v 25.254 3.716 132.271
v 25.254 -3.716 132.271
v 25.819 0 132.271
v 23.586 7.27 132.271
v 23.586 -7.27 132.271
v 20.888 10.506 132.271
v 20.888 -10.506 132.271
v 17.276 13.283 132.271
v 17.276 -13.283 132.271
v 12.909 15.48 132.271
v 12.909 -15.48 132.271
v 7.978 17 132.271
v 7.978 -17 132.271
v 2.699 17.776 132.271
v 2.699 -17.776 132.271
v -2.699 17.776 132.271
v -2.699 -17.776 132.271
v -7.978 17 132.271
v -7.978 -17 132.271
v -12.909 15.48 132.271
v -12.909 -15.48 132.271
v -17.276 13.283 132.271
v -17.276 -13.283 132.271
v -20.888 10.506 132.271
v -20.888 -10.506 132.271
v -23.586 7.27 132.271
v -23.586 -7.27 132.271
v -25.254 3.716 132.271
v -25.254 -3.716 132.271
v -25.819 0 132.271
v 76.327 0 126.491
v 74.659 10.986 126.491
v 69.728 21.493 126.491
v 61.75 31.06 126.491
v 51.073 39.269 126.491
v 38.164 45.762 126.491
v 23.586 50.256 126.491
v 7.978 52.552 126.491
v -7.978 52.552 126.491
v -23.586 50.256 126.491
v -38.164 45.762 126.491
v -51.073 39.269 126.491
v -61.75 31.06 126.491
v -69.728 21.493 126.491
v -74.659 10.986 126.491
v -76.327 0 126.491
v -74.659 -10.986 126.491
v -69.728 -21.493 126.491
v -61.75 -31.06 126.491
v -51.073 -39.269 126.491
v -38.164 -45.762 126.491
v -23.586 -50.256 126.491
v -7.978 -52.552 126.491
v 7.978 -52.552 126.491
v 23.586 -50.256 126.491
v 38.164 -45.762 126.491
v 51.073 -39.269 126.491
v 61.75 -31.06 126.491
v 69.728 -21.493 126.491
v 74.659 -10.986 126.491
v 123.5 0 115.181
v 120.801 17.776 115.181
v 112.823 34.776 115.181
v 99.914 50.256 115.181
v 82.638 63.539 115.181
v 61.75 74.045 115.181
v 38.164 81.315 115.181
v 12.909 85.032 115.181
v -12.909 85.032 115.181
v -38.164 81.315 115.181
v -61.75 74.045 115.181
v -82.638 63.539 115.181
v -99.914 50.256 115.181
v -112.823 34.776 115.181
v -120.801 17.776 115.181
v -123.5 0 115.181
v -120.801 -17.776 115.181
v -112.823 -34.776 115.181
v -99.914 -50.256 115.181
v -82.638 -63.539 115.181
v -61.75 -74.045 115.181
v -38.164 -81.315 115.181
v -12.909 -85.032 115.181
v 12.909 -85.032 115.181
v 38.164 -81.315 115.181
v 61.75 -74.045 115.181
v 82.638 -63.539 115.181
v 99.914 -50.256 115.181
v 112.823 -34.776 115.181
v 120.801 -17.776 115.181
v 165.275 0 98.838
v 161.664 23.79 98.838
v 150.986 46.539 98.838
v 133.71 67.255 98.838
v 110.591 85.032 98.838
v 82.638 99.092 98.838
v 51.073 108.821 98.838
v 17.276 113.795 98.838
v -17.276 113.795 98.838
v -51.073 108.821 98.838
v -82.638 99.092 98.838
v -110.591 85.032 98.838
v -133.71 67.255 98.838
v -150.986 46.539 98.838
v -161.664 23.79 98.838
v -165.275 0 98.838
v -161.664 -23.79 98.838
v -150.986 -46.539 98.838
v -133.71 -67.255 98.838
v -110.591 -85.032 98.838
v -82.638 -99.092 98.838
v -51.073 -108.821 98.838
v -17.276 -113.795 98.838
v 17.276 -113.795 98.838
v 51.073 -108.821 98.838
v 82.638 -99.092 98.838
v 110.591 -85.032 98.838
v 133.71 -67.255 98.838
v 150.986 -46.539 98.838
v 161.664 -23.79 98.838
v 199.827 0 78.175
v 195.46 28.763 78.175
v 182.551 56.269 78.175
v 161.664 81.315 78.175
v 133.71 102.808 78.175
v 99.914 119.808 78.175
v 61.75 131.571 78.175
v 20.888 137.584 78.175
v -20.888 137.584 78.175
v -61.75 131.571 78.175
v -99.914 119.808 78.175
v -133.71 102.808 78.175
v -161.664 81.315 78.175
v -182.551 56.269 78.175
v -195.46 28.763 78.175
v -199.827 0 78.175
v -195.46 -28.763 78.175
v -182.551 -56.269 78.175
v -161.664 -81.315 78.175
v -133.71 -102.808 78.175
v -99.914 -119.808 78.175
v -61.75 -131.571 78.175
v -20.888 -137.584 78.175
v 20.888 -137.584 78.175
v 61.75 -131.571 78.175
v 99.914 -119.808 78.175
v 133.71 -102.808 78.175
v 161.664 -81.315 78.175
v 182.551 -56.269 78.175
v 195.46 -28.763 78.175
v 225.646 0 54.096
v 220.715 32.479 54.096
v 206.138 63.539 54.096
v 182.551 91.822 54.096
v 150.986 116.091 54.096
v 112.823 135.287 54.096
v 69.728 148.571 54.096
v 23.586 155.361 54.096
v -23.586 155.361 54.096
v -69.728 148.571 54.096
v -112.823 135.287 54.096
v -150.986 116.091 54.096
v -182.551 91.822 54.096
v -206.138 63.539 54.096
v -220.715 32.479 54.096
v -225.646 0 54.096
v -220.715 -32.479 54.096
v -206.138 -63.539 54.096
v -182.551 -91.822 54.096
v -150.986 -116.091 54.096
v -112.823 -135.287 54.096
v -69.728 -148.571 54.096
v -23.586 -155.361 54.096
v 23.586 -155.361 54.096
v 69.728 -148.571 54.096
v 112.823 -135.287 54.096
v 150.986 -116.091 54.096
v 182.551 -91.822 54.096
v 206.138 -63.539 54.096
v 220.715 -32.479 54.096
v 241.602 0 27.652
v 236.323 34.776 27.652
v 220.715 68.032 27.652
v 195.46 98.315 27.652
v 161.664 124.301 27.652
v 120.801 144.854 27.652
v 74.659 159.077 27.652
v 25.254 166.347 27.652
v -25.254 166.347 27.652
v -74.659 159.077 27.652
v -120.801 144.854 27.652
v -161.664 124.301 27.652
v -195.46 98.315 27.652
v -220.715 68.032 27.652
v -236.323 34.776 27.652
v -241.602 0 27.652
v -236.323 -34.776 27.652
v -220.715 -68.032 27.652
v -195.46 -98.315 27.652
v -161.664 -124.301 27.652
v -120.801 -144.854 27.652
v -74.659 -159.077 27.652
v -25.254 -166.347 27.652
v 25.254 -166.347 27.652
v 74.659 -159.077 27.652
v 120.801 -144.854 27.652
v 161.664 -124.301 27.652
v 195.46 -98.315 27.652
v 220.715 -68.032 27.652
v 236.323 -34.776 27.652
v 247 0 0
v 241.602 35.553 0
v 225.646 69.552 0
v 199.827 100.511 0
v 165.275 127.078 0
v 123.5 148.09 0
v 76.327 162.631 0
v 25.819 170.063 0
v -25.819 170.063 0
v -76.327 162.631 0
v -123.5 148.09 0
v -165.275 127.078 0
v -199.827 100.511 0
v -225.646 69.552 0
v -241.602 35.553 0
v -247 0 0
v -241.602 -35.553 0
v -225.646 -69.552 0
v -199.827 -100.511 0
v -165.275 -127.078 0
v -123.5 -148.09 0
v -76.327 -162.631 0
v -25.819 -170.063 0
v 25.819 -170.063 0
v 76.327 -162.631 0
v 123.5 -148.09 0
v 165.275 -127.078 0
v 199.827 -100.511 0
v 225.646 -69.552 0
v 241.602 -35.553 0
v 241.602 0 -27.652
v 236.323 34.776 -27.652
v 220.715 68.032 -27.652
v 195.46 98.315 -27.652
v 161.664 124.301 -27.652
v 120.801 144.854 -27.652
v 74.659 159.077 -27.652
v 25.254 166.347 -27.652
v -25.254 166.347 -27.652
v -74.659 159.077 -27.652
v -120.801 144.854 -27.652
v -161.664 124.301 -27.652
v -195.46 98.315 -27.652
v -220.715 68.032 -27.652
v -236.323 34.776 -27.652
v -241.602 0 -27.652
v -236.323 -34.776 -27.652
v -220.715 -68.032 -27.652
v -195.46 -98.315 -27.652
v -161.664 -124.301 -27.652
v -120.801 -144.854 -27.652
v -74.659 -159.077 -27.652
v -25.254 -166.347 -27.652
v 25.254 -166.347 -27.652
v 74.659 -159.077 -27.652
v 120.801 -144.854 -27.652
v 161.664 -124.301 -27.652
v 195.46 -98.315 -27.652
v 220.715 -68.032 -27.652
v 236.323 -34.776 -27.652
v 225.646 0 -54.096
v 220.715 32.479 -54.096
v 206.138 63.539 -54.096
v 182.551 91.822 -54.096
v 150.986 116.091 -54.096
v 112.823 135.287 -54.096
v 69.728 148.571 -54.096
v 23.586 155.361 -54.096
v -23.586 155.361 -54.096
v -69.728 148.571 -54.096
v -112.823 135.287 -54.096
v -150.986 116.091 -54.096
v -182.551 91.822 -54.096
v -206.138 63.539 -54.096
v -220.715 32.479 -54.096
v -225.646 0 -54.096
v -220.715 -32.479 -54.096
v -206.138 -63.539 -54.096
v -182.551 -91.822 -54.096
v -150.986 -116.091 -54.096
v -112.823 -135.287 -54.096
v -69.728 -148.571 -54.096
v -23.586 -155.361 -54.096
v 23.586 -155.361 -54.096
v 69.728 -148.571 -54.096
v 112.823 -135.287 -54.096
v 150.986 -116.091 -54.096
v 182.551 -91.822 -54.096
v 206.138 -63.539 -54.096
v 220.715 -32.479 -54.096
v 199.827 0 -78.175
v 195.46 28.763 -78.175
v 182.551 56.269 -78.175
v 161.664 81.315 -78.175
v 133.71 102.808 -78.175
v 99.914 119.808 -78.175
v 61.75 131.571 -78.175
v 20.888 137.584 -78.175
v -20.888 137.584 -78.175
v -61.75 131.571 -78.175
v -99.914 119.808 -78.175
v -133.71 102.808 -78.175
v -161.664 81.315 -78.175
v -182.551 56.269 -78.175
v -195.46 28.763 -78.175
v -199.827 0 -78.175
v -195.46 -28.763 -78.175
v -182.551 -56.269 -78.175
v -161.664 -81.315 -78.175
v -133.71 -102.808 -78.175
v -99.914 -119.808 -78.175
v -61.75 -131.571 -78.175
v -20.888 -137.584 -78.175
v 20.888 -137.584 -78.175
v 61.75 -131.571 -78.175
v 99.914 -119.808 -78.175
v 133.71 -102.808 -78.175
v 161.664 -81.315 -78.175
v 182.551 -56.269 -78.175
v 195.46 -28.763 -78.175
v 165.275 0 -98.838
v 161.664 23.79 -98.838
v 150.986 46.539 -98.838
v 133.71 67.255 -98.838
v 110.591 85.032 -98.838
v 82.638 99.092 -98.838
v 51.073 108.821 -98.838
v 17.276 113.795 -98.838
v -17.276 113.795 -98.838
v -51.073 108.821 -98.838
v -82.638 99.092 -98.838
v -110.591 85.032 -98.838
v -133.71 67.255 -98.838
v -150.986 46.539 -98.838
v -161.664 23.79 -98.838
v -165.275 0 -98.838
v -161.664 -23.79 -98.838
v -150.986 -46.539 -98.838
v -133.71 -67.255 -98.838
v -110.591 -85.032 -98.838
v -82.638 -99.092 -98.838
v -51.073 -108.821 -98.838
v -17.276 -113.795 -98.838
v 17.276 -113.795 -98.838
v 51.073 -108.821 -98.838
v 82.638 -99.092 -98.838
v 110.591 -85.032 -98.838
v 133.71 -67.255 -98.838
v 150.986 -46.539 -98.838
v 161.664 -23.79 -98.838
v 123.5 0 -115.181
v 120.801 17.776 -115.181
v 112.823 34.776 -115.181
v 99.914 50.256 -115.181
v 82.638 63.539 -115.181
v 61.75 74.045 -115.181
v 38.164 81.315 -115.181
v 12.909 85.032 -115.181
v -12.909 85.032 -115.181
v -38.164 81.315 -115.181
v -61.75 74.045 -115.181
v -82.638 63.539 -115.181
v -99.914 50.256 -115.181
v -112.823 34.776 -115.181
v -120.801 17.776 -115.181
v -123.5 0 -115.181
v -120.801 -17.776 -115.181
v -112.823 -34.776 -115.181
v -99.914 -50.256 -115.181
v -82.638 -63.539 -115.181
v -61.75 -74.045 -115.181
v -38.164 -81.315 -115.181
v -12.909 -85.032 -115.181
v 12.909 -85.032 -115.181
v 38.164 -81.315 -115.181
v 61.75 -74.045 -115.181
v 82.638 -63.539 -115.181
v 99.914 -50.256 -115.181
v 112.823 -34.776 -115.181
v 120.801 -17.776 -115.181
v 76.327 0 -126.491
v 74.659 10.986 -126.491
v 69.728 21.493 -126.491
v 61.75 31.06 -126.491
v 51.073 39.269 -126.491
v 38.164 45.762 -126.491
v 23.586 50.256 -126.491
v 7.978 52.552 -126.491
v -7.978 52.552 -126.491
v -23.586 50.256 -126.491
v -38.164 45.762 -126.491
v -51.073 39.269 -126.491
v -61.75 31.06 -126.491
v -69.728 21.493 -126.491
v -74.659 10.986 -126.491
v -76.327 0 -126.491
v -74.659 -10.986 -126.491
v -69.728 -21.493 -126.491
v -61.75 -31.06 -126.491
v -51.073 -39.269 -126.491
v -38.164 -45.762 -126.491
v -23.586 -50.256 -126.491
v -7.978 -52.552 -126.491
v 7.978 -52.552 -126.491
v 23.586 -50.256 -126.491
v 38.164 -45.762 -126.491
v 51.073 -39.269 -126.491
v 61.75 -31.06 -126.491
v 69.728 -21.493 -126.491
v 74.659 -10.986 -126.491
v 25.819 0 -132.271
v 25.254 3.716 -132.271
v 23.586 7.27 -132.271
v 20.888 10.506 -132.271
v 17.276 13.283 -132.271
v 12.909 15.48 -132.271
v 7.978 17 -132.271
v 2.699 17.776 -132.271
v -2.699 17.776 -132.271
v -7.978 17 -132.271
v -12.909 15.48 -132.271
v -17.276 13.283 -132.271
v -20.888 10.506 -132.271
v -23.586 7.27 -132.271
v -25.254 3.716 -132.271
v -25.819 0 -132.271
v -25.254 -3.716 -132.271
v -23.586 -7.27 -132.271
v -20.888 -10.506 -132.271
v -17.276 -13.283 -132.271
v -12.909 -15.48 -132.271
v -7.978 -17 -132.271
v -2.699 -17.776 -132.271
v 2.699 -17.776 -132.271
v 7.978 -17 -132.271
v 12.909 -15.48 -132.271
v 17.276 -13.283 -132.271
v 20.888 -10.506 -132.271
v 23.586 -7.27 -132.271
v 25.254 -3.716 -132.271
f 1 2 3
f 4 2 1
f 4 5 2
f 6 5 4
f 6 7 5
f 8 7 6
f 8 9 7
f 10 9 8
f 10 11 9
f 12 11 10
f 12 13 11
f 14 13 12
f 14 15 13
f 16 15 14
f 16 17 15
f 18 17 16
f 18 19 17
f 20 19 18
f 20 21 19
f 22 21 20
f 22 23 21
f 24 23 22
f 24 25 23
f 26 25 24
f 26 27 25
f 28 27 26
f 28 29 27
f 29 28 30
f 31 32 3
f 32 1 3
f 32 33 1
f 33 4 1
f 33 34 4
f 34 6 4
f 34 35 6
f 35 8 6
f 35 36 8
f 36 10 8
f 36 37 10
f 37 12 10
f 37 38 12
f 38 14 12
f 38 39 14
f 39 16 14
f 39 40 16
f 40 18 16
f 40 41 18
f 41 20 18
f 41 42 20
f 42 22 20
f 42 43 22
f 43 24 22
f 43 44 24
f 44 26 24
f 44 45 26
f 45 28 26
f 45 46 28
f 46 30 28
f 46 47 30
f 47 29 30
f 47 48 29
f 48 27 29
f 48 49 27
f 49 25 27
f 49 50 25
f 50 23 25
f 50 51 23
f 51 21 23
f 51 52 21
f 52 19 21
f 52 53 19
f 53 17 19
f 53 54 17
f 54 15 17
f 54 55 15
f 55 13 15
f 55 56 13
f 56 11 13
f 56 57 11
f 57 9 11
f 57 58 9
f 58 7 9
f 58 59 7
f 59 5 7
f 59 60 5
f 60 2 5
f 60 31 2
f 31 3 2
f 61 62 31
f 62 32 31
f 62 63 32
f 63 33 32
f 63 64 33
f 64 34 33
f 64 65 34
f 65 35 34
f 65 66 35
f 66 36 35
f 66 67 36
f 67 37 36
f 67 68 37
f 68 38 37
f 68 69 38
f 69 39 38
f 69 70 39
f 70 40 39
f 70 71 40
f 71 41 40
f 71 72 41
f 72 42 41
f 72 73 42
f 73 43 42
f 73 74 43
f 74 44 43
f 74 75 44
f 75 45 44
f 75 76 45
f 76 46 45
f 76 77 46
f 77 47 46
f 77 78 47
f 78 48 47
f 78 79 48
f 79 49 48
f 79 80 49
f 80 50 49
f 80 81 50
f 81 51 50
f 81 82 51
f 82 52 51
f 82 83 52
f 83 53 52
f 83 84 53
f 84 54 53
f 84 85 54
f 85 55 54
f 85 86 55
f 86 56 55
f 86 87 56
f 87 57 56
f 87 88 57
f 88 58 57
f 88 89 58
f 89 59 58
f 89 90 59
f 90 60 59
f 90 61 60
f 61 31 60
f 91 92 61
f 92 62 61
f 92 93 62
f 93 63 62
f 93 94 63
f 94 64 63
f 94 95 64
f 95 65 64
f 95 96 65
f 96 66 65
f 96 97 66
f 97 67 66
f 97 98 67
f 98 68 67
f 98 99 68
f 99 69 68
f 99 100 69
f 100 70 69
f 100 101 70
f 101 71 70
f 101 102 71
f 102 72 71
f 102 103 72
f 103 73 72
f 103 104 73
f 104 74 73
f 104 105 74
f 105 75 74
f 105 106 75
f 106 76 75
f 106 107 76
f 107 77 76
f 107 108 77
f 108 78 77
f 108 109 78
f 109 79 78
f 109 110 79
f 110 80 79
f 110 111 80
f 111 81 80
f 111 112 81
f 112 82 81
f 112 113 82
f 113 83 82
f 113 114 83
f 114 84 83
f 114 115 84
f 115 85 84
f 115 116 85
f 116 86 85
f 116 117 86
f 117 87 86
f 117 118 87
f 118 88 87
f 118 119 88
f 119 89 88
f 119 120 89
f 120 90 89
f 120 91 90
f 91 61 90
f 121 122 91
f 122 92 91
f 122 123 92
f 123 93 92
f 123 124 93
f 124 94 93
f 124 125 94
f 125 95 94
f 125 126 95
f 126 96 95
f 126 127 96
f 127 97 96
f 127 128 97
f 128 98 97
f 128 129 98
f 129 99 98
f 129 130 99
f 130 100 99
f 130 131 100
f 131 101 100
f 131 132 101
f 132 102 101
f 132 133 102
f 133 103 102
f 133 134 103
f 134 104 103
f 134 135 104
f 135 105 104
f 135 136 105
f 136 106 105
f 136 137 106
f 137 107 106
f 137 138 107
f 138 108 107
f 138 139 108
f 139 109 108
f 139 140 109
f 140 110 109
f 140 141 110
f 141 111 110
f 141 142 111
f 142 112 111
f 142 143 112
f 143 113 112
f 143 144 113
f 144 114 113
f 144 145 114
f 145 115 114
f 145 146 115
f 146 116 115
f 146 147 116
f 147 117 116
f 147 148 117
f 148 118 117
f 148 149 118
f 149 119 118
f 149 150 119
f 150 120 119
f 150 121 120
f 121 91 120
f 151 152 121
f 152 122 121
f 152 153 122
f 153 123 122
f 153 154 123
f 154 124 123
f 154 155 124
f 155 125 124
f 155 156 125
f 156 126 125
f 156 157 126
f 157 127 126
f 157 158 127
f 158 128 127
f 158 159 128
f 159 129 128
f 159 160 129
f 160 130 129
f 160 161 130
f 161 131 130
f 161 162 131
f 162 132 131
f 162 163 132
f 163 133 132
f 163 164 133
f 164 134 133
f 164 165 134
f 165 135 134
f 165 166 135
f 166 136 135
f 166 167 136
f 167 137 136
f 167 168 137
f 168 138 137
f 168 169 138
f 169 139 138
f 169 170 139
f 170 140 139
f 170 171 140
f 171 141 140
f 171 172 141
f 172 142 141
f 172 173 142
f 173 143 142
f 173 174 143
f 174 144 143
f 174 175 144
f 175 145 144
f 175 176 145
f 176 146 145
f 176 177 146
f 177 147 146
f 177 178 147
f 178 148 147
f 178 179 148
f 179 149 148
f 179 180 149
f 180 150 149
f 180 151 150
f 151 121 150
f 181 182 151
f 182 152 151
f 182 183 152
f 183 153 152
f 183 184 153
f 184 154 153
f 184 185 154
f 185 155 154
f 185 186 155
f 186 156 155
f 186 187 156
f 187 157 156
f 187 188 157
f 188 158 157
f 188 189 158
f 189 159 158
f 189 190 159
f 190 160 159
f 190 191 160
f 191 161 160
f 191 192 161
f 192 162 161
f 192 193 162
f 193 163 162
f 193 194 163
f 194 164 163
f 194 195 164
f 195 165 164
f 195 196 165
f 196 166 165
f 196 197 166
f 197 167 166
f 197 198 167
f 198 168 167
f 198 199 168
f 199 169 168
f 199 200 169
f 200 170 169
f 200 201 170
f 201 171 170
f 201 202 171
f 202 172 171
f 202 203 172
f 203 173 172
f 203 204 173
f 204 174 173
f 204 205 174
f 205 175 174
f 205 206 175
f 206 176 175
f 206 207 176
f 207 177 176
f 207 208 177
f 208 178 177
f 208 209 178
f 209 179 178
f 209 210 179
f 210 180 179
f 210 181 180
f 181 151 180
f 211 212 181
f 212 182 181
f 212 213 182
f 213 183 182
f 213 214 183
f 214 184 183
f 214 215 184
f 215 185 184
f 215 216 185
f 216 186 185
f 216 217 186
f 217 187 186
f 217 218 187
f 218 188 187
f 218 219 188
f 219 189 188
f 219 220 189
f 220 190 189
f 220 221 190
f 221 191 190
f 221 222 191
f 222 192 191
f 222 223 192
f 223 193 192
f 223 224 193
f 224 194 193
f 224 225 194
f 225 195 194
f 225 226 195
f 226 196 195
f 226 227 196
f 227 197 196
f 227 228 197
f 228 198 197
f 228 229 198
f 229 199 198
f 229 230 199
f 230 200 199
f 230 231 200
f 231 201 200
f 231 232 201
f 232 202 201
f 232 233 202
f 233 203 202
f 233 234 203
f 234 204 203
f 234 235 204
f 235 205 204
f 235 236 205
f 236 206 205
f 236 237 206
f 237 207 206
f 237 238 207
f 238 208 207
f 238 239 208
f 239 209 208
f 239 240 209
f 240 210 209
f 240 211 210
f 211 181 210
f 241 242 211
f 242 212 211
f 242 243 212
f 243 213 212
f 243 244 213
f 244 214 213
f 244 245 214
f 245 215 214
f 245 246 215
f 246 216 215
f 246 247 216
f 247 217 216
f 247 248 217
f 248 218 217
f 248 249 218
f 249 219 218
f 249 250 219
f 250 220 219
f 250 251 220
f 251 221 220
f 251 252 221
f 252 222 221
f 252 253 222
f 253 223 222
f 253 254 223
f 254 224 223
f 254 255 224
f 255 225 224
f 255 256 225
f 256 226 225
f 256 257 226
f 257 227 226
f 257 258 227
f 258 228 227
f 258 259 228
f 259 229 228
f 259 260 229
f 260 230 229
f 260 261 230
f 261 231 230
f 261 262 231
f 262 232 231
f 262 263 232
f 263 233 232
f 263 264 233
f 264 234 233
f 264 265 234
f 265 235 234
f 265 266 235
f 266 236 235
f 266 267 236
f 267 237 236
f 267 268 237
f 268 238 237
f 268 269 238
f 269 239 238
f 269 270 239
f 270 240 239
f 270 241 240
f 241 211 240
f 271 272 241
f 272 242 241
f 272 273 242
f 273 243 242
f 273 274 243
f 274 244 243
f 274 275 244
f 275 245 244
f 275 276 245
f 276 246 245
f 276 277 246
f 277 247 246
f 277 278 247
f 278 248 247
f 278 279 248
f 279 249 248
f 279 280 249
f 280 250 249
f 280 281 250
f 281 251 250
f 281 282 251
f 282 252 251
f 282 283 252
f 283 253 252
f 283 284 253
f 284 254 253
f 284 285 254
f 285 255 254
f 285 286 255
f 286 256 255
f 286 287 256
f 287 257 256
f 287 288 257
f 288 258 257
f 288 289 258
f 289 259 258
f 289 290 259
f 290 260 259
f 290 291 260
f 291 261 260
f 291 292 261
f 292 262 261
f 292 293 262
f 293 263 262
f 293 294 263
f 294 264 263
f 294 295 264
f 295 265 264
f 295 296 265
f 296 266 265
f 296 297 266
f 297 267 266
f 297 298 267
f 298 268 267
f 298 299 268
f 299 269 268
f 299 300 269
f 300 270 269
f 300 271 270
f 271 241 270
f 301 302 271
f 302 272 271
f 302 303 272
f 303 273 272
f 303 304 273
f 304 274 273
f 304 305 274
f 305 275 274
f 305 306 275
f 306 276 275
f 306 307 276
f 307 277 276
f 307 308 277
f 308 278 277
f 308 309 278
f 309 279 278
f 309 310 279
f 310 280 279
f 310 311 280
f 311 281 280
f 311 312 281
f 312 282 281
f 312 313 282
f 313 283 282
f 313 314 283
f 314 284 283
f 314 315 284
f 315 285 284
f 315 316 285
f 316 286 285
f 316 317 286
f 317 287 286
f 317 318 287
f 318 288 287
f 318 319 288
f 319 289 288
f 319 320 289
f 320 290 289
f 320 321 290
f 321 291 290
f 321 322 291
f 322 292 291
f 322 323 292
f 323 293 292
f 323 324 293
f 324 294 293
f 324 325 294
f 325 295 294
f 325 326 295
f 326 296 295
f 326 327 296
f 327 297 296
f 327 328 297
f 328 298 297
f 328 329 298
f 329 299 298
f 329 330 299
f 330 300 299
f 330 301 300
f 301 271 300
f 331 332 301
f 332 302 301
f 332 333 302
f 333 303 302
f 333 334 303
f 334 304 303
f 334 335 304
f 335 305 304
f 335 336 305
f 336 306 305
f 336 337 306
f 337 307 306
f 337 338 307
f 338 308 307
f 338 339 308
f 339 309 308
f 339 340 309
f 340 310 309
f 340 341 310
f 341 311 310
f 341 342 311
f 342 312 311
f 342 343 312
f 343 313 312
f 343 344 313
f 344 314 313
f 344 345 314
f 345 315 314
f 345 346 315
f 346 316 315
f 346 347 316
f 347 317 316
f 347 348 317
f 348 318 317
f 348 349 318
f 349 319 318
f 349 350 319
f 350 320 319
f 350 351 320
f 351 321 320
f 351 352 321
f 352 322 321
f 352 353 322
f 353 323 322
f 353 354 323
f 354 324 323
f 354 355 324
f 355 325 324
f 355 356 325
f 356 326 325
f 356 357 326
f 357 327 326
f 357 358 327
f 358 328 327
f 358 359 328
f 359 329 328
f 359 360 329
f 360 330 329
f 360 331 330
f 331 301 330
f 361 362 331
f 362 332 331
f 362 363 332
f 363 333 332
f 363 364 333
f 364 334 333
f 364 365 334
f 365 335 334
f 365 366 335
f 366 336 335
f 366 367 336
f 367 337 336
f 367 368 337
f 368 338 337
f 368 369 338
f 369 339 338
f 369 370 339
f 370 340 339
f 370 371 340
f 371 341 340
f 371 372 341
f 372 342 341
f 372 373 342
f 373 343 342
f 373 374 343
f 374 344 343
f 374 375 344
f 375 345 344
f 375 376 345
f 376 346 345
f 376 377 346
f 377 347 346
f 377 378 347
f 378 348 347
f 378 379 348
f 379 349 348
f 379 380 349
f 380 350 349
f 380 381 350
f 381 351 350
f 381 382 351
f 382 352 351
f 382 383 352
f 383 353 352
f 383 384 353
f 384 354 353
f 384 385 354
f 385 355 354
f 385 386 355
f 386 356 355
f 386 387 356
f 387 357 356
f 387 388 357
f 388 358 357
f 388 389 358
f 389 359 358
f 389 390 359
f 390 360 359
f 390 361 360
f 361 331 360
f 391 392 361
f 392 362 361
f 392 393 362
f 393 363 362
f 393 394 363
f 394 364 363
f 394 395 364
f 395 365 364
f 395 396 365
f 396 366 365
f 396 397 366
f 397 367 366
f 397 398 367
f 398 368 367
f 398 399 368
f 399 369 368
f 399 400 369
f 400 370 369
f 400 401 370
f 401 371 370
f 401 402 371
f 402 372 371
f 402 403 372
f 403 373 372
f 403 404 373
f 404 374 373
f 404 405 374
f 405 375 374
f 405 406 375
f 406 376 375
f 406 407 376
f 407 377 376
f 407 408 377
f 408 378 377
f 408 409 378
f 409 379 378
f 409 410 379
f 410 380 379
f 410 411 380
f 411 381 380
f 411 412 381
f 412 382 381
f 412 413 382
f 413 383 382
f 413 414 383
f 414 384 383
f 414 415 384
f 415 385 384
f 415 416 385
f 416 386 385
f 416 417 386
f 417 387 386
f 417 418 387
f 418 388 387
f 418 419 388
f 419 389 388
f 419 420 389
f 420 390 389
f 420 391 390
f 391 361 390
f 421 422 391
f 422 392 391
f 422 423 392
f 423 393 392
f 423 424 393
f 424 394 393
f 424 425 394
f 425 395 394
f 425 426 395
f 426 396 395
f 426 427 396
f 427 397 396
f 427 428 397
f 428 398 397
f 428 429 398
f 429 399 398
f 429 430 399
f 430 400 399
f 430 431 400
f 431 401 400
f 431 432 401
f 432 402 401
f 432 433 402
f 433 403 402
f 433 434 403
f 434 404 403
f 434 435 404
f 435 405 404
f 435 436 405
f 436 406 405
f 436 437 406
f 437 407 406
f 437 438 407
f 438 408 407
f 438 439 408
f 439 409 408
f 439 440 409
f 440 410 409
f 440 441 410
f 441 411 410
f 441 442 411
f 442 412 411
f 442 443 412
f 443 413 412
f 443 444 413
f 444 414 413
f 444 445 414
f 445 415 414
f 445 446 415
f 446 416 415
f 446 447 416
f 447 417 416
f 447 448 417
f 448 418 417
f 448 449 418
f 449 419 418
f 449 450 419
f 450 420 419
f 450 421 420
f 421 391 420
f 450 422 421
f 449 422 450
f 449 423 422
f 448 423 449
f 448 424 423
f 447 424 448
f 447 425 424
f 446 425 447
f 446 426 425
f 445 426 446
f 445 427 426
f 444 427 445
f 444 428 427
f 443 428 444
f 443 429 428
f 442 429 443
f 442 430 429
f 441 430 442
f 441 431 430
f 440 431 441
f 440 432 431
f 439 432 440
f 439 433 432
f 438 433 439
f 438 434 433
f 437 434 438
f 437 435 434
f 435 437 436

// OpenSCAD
// Generated by SolidPython 1.0.1 on 2020-07-29 00:46:50


scale(v = [13, 9, 7]) {
	sphere(r = 19);
}
/***********************************************
*********      SolidPython code:      **********
************************************************
 
# import packages: SolidPython
from solid import *
from solid.utils import *
from itertools import chain, combinations, permutations


class Resize:

    def __init__(self, scad_file):
        self.scad_file = scad_file
        #self.scad_file = import_scad(scad_file)
        # cone/cylinder param:
        self.r1 = 0
        self.r2 = 0
        self.h = 0
        # rectangular prism param:
        self.w = 0
        self.l = 0
        # ellipse param:
        self.r = 0

    # import OpenScad code (file name corresponds to shape)


    # classify shape + parameters
    def assign(self, param1, param2, param3):
        if self.scad_file == 'cone.scad':
            self.r1 = param1
            self.r2 = param2
            self.h = param3
        elif self.scad_file == 'cylinder.scad':
            self.r1 = param1
            self.r2 = param2
            self.h = param3
        elif self.scad_file == 'rectangularPrism.scad':
            self.h = param1
            self.l = param2
            self.w = param3
        else:
            self.r = param1
            self.h = param2

    # resize parameters
    def iterate(self):
        x = range(3, 20, 2)
        i = 1
        if self.scad_file == 'cone.scad':
            tempList = list(permutations(x, 2))
            for temp in tempList:
                param1 = temp[0]
                param2 = temp[1]
                filepath = 'produced_scad_files/' + 'cone' + str(param1) + '_' + str(param2) + '_' + '.scad'
                scad_render_to_file(cylinder(h=param1, r1=param2, r2=0), filepath)

        elif self.scad_file == 'cylinder.scad':
            tempList = list(permutations(x, 3))
            for temp in tempList:
                param1 = temp[0]
                param2 = temp[1]
                filepath = 'produced_scad_files/' + 'cylinder' + str(param1) + '_' + str(param2) + '_' + '.scad'
                scad_render_to_file(cylinder(h=param1, r1=param2, r2=param2), filepath)

        elif self.scad_file == 'rectangularPrism.scad':
            tempList = list(permutations(x, 3))
            for temp in tempList:
                param1 = temp[0]
                param2 = temp[1]
                param3 = temp[2]
                filepath = 'produced_scad_files/' + 'rectangularPrism' + str(param1) + '_' + str(param2) + '_' + str(
                    param3) + '.scad'
                scad_render_to_file(cube(size=(param1, param2, param3)), filepath)

        elif self.scad_file == 'ellipse.scad':
            tempList = list(permutations(x, 4))
            for temp in tempList:
                param1 = temp[0]
                param2 = temp[1]
                param3 = temp[2]
                param4 = temp[3]
                filepath = 'produced_scad_files/' + 'ellipse' + str(param1) + '_' + str(param2) + '_' + str(param3) + '_' + str(param4) + '.scad'
                scad_render_to_file(scale([param1, param2, param3])(sphere(r=param4)), filepath)

    def render_to_scadfile(self):
        scad_render_to_file(scad, 'example.scad') 
 
************************************************/
